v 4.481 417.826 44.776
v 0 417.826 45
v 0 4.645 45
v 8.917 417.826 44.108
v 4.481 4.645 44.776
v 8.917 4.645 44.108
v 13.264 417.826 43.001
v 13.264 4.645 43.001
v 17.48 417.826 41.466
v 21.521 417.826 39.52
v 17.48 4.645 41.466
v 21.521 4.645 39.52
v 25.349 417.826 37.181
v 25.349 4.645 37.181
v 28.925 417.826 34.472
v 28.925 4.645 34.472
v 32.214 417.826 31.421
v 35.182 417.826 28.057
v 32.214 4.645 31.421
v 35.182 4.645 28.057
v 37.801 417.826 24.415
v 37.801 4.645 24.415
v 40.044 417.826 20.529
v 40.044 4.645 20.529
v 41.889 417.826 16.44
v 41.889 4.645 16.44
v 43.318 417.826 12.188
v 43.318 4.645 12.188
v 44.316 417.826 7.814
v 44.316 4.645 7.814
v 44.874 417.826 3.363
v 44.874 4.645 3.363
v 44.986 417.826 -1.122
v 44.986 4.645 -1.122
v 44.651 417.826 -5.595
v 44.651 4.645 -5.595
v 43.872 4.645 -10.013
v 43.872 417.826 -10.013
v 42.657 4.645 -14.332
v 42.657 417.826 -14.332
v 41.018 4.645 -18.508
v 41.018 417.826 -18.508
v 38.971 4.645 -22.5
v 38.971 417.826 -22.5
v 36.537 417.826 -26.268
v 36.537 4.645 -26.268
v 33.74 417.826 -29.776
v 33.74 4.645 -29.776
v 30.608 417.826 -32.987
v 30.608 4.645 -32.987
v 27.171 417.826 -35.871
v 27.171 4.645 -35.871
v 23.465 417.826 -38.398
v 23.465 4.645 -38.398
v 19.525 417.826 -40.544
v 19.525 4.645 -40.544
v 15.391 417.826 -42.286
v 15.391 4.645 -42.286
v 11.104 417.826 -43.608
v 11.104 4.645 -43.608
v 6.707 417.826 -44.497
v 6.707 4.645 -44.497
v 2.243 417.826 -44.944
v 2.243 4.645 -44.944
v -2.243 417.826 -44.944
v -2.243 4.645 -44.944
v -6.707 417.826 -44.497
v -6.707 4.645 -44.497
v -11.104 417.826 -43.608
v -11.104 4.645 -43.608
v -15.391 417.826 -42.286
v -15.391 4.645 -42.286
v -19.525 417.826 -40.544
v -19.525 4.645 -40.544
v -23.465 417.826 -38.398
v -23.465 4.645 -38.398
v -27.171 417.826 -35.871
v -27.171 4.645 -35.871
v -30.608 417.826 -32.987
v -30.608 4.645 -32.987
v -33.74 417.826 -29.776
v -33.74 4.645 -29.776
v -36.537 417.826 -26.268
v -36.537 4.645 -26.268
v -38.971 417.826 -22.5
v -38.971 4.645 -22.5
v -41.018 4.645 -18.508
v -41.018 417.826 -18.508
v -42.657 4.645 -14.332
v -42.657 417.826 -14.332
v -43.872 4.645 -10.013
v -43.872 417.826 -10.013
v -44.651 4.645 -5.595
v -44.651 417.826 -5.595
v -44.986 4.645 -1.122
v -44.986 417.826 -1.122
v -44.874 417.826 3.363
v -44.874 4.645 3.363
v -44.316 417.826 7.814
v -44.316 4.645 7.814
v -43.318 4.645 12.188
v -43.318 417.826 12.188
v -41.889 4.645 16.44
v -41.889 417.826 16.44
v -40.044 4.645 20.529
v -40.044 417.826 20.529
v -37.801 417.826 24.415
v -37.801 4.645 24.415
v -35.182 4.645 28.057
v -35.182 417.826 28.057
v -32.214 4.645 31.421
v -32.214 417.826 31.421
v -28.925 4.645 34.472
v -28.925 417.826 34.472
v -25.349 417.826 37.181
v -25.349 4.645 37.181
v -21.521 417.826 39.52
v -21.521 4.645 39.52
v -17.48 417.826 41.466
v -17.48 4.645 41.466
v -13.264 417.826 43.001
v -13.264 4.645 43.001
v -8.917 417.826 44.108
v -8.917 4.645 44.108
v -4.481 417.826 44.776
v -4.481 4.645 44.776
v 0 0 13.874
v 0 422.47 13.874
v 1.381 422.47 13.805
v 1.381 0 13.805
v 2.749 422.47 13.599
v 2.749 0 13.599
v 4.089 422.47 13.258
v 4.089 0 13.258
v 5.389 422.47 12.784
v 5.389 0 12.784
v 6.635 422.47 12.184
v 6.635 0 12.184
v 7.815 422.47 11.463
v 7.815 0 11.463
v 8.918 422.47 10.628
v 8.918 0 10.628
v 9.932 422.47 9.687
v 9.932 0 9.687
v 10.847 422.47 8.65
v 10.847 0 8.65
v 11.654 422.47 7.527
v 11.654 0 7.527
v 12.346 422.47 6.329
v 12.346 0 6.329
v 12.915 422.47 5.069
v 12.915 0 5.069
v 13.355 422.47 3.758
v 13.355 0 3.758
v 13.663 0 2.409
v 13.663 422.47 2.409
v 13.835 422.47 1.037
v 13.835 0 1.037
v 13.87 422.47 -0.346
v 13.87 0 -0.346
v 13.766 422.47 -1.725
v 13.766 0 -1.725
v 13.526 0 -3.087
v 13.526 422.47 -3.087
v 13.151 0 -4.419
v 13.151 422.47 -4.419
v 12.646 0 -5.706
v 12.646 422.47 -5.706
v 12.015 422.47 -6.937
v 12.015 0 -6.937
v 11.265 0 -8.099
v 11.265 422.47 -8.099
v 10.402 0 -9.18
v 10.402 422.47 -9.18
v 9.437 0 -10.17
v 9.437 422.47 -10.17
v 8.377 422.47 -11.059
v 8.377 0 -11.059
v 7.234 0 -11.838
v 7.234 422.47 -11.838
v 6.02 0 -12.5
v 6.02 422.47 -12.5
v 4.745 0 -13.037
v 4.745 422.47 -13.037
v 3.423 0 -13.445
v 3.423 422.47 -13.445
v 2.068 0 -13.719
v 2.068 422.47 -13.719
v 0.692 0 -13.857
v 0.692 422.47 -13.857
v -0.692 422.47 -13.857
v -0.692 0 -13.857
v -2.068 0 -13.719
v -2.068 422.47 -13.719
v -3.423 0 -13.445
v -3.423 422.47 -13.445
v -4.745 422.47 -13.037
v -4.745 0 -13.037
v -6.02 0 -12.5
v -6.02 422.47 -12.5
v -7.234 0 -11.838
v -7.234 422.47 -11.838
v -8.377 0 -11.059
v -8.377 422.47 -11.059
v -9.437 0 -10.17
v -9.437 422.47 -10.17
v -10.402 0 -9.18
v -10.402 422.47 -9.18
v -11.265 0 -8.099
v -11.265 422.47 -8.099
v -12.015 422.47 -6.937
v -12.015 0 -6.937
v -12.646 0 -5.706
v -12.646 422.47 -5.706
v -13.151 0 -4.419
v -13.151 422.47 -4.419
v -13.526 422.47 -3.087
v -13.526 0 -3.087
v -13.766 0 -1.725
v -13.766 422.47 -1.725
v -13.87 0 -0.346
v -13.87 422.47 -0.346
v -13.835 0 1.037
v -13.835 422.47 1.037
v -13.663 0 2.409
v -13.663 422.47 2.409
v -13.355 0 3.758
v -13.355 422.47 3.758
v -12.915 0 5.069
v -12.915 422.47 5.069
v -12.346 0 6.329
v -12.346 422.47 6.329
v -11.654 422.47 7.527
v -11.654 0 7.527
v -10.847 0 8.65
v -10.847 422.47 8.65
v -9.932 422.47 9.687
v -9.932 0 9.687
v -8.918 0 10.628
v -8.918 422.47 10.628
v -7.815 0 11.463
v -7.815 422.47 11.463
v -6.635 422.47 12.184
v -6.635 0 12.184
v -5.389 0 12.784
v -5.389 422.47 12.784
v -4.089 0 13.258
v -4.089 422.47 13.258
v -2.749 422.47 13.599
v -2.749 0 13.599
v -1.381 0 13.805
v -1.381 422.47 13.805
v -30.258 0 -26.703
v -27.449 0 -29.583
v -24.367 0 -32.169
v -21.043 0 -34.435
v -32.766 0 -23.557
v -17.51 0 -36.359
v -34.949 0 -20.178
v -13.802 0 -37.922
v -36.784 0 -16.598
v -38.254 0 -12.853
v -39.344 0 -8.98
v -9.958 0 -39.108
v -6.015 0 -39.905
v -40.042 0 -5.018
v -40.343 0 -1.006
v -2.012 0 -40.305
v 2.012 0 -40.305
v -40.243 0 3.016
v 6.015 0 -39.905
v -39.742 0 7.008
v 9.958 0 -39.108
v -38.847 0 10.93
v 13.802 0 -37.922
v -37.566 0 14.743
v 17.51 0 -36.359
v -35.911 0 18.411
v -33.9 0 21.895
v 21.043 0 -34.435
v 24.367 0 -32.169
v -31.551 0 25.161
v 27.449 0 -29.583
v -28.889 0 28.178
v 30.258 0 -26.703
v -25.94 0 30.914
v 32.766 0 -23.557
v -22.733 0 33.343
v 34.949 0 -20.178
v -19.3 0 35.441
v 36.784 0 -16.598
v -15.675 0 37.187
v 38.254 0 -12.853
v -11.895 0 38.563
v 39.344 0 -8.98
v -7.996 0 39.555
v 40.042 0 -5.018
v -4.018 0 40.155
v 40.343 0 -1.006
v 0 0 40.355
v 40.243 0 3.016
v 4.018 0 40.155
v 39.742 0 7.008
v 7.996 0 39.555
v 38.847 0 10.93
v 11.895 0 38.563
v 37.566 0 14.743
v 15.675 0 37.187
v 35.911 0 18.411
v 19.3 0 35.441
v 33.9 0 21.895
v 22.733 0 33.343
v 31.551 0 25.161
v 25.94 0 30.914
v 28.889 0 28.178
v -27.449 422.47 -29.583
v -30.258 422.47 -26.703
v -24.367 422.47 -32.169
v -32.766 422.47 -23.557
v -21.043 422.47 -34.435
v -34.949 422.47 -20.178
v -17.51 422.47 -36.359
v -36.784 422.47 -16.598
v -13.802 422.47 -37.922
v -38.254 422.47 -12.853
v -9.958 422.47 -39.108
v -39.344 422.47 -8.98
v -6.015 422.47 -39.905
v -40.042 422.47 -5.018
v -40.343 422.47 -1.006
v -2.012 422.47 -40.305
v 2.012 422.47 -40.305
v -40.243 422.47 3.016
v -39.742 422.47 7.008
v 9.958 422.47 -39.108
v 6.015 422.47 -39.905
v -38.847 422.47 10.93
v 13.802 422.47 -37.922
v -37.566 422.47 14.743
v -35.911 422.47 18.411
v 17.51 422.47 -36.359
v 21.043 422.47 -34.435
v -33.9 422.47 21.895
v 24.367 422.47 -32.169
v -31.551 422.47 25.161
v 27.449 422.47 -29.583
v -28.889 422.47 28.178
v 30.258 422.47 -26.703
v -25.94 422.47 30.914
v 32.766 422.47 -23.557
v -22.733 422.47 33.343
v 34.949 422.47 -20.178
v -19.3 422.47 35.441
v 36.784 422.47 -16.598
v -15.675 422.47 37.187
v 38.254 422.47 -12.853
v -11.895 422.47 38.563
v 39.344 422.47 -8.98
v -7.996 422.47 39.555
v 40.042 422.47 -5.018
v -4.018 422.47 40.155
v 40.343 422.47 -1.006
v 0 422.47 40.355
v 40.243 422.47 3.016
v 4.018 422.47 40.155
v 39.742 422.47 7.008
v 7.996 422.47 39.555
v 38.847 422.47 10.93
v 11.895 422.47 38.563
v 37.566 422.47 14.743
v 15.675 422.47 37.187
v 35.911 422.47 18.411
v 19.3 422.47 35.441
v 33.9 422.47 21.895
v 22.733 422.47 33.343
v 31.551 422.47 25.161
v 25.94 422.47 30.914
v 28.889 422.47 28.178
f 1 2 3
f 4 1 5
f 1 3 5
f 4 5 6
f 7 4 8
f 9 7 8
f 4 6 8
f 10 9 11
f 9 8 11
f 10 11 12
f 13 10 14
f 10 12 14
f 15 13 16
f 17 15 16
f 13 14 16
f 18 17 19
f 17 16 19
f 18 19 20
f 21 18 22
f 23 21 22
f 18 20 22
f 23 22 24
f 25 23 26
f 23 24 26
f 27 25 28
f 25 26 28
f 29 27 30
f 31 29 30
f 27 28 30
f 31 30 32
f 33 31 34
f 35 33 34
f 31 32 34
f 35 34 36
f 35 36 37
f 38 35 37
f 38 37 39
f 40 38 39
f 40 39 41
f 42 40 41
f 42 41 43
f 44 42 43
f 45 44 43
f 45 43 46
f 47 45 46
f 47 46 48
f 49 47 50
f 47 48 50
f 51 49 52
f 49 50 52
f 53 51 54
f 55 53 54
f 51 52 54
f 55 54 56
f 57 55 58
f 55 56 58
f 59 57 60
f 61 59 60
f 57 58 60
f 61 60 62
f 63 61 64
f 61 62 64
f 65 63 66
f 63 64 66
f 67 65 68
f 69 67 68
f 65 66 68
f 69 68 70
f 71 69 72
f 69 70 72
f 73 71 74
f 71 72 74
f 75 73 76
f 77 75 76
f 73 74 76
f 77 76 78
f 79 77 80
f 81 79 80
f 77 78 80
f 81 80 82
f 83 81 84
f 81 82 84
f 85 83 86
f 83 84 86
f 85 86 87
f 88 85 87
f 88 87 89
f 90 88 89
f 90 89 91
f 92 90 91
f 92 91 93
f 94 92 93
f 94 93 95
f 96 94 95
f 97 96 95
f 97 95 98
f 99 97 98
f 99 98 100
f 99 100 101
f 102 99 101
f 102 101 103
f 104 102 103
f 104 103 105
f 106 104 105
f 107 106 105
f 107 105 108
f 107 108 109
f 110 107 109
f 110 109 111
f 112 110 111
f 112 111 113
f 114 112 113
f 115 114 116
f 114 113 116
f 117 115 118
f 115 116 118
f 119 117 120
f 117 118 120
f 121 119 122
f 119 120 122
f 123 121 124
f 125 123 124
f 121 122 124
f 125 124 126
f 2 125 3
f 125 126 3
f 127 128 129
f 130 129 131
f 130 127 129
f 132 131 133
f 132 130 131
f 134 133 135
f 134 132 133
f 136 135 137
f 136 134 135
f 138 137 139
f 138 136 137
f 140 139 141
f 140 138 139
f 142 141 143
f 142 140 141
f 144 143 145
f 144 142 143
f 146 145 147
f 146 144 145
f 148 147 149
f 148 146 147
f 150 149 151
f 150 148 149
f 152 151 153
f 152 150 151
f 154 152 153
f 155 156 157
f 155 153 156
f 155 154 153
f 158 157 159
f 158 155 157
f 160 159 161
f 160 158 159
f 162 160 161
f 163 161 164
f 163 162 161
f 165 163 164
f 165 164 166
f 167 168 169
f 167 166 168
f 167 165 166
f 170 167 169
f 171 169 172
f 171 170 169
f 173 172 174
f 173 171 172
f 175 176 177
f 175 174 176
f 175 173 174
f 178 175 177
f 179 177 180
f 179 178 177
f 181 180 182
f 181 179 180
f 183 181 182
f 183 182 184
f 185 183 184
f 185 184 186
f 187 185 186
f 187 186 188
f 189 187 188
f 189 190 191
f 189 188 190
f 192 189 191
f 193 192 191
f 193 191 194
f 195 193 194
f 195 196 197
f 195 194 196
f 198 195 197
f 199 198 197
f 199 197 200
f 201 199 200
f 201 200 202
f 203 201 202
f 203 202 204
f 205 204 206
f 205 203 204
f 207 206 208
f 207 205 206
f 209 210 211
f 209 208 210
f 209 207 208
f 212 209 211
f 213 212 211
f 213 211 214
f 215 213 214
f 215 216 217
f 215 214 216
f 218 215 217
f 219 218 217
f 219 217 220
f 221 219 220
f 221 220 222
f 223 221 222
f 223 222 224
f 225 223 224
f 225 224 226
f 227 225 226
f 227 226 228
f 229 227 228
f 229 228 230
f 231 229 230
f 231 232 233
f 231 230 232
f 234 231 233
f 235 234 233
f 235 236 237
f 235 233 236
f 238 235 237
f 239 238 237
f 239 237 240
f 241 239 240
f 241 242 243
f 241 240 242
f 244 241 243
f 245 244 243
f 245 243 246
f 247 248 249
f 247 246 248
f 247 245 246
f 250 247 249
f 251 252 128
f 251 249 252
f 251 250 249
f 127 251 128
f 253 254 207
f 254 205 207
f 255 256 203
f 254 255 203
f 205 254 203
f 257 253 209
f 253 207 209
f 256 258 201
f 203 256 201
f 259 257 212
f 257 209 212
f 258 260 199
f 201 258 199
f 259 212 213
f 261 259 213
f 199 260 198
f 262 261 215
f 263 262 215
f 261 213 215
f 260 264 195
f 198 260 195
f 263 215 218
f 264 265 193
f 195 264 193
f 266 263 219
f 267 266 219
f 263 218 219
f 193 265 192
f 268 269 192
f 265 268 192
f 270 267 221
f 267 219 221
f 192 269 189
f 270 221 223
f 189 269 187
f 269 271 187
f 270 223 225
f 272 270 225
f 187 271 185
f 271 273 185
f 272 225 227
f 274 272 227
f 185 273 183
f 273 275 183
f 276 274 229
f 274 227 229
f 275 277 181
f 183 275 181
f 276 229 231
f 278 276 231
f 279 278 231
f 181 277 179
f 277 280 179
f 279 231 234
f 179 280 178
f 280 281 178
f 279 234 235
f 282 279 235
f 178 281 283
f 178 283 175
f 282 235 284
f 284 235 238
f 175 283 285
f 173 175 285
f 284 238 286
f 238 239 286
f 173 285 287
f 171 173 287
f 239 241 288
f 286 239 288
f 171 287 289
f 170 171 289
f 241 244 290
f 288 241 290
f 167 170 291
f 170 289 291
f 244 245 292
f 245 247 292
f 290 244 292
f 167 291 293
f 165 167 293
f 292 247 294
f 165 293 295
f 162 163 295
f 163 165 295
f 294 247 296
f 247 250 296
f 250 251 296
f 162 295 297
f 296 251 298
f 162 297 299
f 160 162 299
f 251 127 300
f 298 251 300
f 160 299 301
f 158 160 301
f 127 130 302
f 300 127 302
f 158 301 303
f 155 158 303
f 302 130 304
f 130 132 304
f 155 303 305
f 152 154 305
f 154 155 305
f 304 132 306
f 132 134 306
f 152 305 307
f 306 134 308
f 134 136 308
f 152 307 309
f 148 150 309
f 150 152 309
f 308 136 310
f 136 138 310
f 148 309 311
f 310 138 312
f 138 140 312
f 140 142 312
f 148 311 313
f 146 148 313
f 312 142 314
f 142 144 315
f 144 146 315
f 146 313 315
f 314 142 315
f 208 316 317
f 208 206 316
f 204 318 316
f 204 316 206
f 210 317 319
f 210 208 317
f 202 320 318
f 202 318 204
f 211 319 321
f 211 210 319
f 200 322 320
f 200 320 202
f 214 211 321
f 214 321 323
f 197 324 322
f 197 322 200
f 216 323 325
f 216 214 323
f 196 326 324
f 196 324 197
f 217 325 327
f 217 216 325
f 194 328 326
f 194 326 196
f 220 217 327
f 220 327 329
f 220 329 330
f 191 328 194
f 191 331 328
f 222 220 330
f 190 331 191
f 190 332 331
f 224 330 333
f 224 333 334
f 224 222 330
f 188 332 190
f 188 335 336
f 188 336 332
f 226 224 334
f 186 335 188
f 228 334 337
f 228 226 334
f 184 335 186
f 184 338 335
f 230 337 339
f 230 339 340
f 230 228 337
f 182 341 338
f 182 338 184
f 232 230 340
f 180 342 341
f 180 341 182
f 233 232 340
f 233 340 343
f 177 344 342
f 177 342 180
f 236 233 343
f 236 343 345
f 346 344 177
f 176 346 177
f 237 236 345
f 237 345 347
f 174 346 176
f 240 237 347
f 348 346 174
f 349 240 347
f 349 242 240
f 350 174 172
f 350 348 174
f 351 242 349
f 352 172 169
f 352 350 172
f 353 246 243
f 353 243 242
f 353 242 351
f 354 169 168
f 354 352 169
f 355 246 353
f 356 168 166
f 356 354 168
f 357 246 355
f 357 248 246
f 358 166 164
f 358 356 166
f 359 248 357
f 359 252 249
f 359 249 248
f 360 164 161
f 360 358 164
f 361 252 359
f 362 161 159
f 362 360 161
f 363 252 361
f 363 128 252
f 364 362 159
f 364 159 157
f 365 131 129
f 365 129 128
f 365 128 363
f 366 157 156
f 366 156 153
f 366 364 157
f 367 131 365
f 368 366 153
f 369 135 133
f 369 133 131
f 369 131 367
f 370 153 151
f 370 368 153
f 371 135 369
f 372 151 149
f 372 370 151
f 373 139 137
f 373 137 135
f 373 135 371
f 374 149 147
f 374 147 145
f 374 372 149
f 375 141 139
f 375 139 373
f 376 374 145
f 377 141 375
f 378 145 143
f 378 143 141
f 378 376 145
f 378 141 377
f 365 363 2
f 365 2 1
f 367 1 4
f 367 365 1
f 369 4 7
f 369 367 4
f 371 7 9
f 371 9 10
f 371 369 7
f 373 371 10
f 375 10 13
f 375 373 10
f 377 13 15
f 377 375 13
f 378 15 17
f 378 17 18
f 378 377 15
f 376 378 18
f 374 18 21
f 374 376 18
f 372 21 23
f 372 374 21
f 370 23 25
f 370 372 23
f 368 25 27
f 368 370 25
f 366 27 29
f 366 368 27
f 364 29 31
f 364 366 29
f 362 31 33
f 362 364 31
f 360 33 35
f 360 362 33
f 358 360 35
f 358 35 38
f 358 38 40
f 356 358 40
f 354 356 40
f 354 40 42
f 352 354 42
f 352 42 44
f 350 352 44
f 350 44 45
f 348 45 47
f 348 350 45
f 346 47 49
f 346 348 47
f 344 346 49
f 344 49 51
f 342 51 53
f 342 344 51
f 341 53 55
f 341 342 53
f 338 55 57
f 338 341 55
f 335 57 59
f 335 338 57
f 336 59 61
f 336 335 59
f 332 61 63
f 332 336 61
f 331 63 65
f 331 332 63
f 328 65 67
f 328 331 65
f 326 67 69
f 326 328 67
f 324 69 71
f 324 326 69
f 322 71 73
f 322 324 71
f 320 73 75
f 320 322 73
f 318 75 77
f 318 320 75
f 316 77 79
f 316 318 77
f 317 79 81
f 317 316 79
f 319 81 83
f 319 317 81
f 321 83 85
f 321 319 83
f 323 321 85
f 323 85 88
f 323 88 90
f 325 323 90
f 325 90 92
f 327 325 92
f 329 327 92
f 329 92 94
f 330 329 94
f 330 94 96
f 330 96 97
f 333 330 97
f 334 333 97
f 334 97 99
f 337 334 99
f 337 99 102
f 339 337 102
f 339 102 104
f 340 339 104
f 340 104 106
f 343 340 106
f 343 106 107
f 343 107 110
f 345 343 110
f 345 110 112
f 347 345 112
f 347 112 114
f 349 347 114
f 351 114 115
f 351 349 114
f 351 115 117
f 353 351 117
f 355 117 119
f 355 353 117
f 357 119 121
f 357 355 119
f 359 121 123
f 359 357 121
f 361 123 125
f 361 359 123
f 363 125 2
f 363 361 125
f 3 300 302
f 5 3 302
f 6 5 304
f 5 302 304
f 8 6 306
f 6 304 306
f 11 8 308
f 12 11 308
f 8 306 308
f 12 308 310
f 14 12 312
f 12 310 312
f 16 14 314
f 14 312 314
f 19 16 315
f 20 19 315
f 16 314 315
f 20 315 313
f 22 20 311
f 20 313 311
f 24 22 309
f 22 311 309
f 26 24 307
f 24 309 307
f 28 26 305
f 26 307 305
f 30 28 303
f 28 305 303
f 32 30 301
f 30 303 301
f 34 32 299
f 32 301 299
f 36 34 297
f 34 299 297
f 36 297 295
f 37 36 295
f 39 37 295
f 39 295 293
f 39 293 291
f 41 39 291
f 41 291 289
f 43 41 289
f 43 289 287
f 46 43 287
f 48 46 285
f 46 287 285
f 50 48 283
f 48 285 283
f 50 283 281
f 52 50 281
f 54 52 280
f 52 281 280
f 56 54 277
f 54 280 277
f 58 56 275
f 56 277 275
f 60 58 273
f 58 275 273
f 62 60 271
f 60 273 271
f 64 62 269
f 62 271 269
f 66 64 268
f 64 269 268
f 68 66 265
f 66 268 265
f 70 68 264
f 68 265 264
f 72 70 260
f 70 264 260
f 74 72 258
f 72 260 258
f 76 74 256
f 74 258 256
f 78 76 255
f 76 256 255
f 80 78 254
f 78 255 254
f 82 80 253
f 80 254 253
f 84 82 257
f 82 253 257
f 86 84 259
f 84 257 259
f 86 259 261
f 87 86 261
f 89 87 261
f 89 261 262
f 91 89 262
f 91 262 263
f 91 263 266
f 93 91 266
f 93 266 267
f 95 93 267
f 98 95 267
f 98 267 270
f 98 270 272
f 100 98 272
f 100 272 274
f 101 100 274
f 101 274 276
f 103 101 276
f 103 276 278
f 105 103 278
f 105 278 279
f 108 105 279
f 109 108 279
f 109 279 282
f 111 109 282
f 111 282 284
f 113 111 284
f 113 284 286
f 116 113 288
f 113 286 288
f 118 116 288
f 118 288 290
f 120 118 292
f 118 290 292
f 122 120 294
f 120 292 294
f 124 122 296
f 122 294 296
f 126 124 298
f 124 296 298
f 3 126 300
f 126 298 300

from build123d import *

# Parameters (mm, degrees)
SKETCH1_R           = 45
BOSS_EXTRUDE1_DEPTH = 422.470347814
SKETCH2_R           = 13.873885303
CUT_EXTRUDE1_DEPTH  = 428.236696437
CHAMFER1_SIZE       = 4.644584106


with BuildPart() as part:
    # Sketch1 → Boss-Extrude1 (new body)
    with BuildSketch(Plane(origin=(0, 0, 0), x_dir=(1, 0, 0), z_dir=(0, 1, 0))):
        Circle(SKETCH1_R)
    extrude(amount=BOSS_EXTRUDE1_DEPTH)

    # Sketch2 → Cut-Extrude1 (cut, through all)
    with BuildSketch(Plane(origin=(0, 0, 0), x_dir=(1, 0, 0), z_dir=(0, 1, 0))):
        Circle(SKETCH2_R)
    extrude(amount=CUT_EXTRUDE1_DEPTH, mode=Mode.SUBTRACT)

    # Chamfer1
    chamfer1_edges = [part.edges().sort_by_distance(p)[0] for p in [
        (-45, 422.470347814, 0),
        (-45, 0, 0),
    ]]
    chamfer(chamfer1_edges, length=CHAMFER1_SIZE)


solid = part.part
